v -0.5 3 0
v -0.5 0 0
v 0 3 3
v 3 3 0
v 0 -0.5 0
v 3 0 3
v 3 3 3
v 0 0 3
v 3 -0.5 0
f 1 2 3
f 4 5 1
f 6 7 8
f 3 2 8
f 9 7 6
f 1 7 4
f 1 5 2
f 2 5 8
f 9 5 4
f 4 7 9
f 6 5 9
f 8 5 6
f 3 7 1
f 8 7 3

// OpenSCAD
* hull() {
    translate([0, -1, 0]) rotate([-15,0,0]) cube(3,center=true);
    rotate([0,0,90]) translate([0, -1, 0]) rotate([-15,0,0]) cube(3,center=true);
}

hull() {
    polyhedron(points = [
        [-.5,0,0],
        [-.5,3,0],
        [0,3,3],
        [0,0,3],

        [0,-.5,0],
        [3,-.5,0],
        [3,0,3],

        [3,3,3],
        [3,3,0],
        [0,0,0]
    ], faces = [
        [0,1,2,3],
        [4,5,6,3],
        [2,3,6,7],
        [0,1,4,5,8]
    ]);
}
